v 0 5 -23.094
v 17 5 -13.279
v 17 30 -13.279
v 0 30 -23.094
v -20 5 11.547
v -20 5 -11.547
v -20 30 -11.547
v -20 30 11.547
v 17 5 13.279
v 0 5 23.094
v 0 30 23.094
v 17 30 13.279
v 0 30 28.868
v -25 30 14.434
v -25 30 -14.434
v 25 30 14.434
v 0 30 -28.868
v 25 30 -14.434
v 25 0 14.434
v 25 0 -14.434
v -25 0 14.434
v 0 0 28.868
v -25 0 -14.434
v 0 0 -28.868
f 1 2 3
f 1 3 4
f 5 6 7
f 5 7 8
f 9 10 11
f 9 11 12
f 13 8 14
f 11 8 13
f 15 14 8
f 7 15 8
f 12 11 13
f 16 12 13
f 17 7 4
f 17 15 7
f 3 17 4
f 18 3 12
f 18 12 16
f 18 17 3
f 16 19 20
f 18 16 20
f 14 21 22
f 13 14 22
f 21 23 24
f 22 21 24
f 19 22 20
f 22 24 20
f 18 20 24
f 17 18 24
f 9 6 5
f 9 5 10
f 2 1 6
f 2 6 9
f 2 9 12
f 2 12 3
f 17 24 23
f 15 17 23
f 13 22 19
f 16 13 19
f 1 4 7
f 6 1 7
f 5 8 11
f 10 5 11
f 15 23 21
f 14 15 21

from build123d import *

# Parameters (mm, degrees)
EXTRUDE_1_DEPTH = 30
SHELL_START     = 5
SHELL_1_DEPTH   = 25


# Read off the part's stored shape, not the designer's step: 薄殼1
with BuildPart() as part:
    # 草圖1 → 伸長1 (new body)
    with BuildSketch(Plane(origin=(0, 0, 0), x_dir=(1, 0, 0), z_dir=(0, 1, 0))):
        Polygon((0, 28.867513459), (-25, 14.43375673), (-25, -14.43375673), (0, -28.867513459), (25, -14.43375673), (25, 14.43375673), align=None)
    extrude(amount=EXTRUDE_1_DEPTH)

    # 薄殼1 outline → 薄殼1 (cut)
    with BuildSketch(Plane(origin=(0, 0, 0), x_dir=(1, 0, 0), z_dir=(0, 1, 0)).offset(SHELL_START)):
        Polygon((17, 13.279056191), (0, 23.094010768), (-20, 11.547005384), (-20, -11.547005384), (0, -23.094010768), (17, -13.279056191), align=None)
    extrude(amount=SHELL_1_DEPTH, mode=Mode.SUBTRACT)


solid = part.part
